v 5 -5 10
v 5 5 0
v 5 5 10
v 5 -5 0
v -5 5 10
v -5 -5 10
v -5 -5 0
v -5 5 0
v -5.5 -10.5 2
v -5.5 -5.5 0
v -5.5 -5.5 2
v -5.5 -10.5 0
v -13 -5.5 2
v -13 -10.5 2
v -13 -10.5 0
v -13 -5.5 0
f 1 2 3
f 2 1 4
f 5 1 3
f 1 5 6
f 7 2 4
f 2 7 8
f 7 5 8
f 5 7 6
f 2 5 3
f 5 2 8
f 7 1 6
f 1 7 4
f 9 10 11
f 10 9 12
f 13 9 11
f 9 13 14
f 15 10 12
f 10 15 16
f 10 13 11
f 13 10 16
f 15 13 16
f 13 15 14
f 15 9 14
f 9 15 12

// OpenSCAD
translate([0, 0, 5]) color([0,1,0,0.9]) cube([10, 10, 10], center=true);
translate([-5.75, -5.75, 1]) color([1,0,0]) cube([0.5, 0.5, 2], center=true);
translate([-6.25, -5.75, 1]) color([1,0,0]) cube([0.5, 0.5, 2], center=true);
translate([-6.75, -5.75, 1]) color([1,0,0]) cube([0.5, 0.5, 2], center=true);
translate([-7.25, -5.75, 1]) color([1,0,0]) cube([0.5, 0.5, 2], center=true);
translate([-7.75, -5.75, 1]) color([1,0,0]) cube([0.5, 0.5, 2], center=true);
translate([-8.25, -5.75, 1]) color([1,0,0]) cube([0.5, 0.5, 2], center=true);
translate([-8.75, -5.75, 1]) color([1,0,0]) cube([0.5, 0.5, 2], center=true);
translate([-9.25, -5.75, 1]) color([1,0,0]) cube([0.5, 0.5, 2], center=true);
translate([-9.75, -5.75, 1]) color([1,0,0]) cube([0.5, 0.5, 2], center=true);
translate([-10.25, -5.75, 1]) color([1,0,0]) cube([0.5, 0.5, 2], center=true);
translate([-10.75, -5.75, 1]) color([1,0,0]) cube([0.5, 0.5, 2], center=true);
translate([-11.25, -5.75, 1]) color([1,0,0]) cube([0.5, 0.5, 2], center=true);
translate([-11.75, -5.75, 1]) color([1,0,0]) cube([0.5, 0.5, 2], center=true);
translate([-12.25, -5.75, 1]) color([1,0,0]) cube([0.5, 0.5, 2], center=true);
translate([-12.75, -5.75, 1]) color([1,0,0]) cube([0.5, 0.5, 2], center=true);
translate([-5.75, -6.25, 1]) color([1,0,0]) cube([0.5, 0.5, 2], center=true);
translate([-6.25, -6.25, 1]) color([1,0,0]) cube([0.5, 0.5, 2], center=true);
translate([-6.75, -6.25, 1]) color([1,0,0]) cube([0.5, 0.5, 2], center=true);
translate([-7.25, -6.25, 1]) color([1,0,0]) cube([0.5, 0.5, 2], center=true);
translate([-7.75, -6.25, 1]) color([1,0,0]) cube([0.5, 0.5, 2], center=true);
translate([-8.25, -6.25, 1]) color([1,0,0]) cube([0.5, 0.5, 2], center=true);
translate([-8.75, -6.25, 1]) color([1,0,0]) cube([0.5, 0.5, 2], center=true);
translate([-9.25, -6.25, 1]) color([1,0,0]) cube([0.5, 0.5, 2], center=true);
translate([-9.75, -6.25, 1]) color([1,0,0]) cube([0.5, 0.5, 2], center=true);
translate([-10.25, -6.25, 1]) color([1,0,0]) cube([0.5, 0.5, 2], center=true);
translate([-10.75, -6.25, 1]) color([1,0,0]) cube([0.5, 0.5, 2], center=true);
translate([-11.25, -6.25, 1]) color([1,0,0]) cube([0.5, 0.5, 2], center=true);
translate([-11.75, -6.25, 1]) color([1,0,0]) cube([0.5, 0.5, 2], center=true);
translate([-12.25, -6.25, 1]) color([1,0,0]) cube([0.5, 0.5, 2], center=true);
translate([-12.75, -6.25, 1]) color([1,0,0]) cube([0.5, 0.5, 2], center=true);
translate([-5.75, -6.75, 1]) color([1,0,0]) cube([0.5, 0.5, 2], center=true);
translate([-6.25, -6.75, 1]) color([1,0,0]) cube([0.5, 0.5, 2], center=true);
translate([-6.75, -6.75, 1]) color([1,0,0]) cube([0.5, 0.5, 2], center=true);
translate([-7.25, -6.75, 1]) color([1,0,0]) cube([0.5, 0.5, 2], center=true);
translate([-7.75, -6.75, 1]) color([1,0,0]) cube([0.5, 0.5, 2], center=true);
translate([-8.25, -6.75, 1]) color([1,0,0]) cube([0.5, 0.5, 2], center=true);
translate([-8.75, -6.75, 1]) color([1,0,0]) cube([0.5, 0.5, 2], center=true);
translate([-9.25, -6.75, 1]) color([1,0,0]) cube([0.5, 0.5, 2], center=true);
translate([-9.75, -6.75, 1]) color([1,0,0]) cube([0.5, 0.5, 2], center=true);
translate([-10.25, -6.75, 1]) color([1,0,0]) cube([0.5, 0.5, 2], center=true);
translate([-10.75, -6.75, 1]) color([1,0,0]) cube([0.5, 0.5, 2], center=true);
translate([-11.25, -6.75, 1]) color([1,0,0]) cube([0.5, 0.5, 2], center=true);
translate([-11.75, -6.75, 1]) color([1,0,0]) cube([0.5, 0.5, 2], center=true);
translate([-12.25, -6.75, 1]) color([1,0,0]) cube([0.5, 0.5, 2], center=true);
translate([-12.75, -6.75, 1]) color([1,0,0]) cube([0.5, 0.5, 2], center=true);
translate([-5.75, -7.25, 1]) color([1,0,0]) cube([0.5, 0.5, 2], center=true);
translate([-6.25, -7.25, 1]) color([1,0,0]) cube([0.5, 0.5, 2], center=true);
translate([-6.75, -7.25, 1]) color([1,0,0]) cube([0.5, 0.5, 2], center=true);
translate([-7.25, -7.25, 1]) color([1,0,0]) cube([0.5, 0.5, 2], center=true);
translate([-7.75, -7.25, 1]) color([1,0,0]) cube([0.5, 0.5, 2], center=true);
translate([-8.25, -7.25, 1]) color([1,0,0]) cube([0.5, 0.5, 2], center=true);
translate([-8.75, -7.25, 1]) color([1,0,0]) cube([0.5, 0.5, 2], center=true);
translate([-9.25, -7.25, 1]) color([1,0,0]) cube([0.5, 0.5, 2], center=true);
translate([-9.75, -7.25, 1]) color([1,0,0]) cube([0.5, 0.5, 2], center=true);
translate([-10.25, -7.25, 1]) color([1,0,0]) cube([0.5, 0.5, 2], center=true);
translate([-10.75, -7.25, 1]) color([1,0,0]) cube([0.5, 0.5, 2], center=true);
translate([-11.25, -7.25, 1]) color([1,0,0]) cube([0.5, 0.5, 2], center=true);
translate([-11.75, -7.25, 1]) color([1,0,0]) cube([0.5, 0.5, 2], center=true);
translate([-12.25, -7.25, 1]) color([1,0,0]) cube([0.5, 0.5, 2], center=true);
translate([-12.75, -7.25, 1]) color([1,0,0]) cube([0.5, 0.5, 2], center=true);
translate([-5.75, -7.75, 1]) color([1,0,0]) cube([0.5, 0.5, 2], center=true);
translate([-6.25, -7.75, 1]) color([1,0,0]) cube([0.5, 0.5, 2], center=true);
translate([-6.75, -7.75, 1]) color([1,0,0]) cube([0.5, 0.5, 2], center=true);
translate([-7.25, -7.75, 1]) color([1,0,0]) cube([0.5, 0.5, 2], center=true);
translate([-7.75, -7.75, 1]) color([1,0,0]) cube([0.5, 0.5, 2], center=true);
translate([-8.25, -7.75, 1]) color([1,0,0]) cube([0.5, 0.5, 2], center=true);
translate([-8.75, -7.75, 1]) color([1,0,0]) cube([0.5, 0.5, 2], center=true);
translate([-9.25, -7.75, 1]) color([1,0,0]) cube([0.5, 0.5, 2], center=true);
translate([-9.75, -7.75, 1]) color([1,0,0]) cube([0.5, 0.5, 2], center=true);
translate([-10.25, -7.75, 1]) color([1,0,0]) cube([0.5, 0.5, 2], center=true);
translate([-10.75, -7.75, 1]) color([1,0,0]) cube([0.5, 0.5, 2], center=true);
translate([-11.25, -7.75, 1]) color([1,0,0]) cube([0.5, 0.5, 2], center=true);
translate([-11.75, -7.75, 1]) color([1,0,0]) cube([0.5, 0.5, 2], center=true);
translate([-12.25, -7.75, 1]) color([1,0,0]) cube([0.5, 0.5, 2], center=true);
translate([-12.75, -7.75, 1]) color([1,0,0]) cube([0.5, 0.5, 2], center=true);
translate([-5.75, -8.25, 1]) color([1,0,0]) cube([0.5, 0.5, 2], center=true);
translate([-6.25, -8.25, 1]) color([1,0,0]) cube([0.5, 0.5, 2], center=true);
translate([-6.75, -8.25, 1]) color([1,0,0]) cube([0.5, 0.5, 2], center=true);
translate([-7.25, -8.25, 1]) color([1,0,0]) cube([0.5, 0.5, 2], center=true);
translate([-7.75, -8.25, 1]) color([1,0,0]) cube([0.5, 0.5, 2], center=true);
translate([-8.25, -8.25, 1]) color([1,0,0]) cube([0.5, 0.5, 2], center=true);
translate([-8.75, -8.25, 1]) color([1,0,0]) cube([0.5, 0.5, 2], center=true);
translate([-9.25, -8.25, 1]) color([1,0,0]) cube([0.5, 0.5, 2], center=true);
translate([-9.75, -8.25, 1]) color([1,0,0]) cube([0.5, 0.5, 2], center=true);
translate([-10.25, -8.25, 1]) color([1,0,0]) cube([0.5, 0.5, 2], center=true);
translate([-10.75, -8.25, 1]) color([1,0,0]) cube([0.5, 0.5, 2], center=true);
translate([-11.25, -8.25, 1]) color([1,0,0]) cube([0.5, 0.5, 2], center=true);
translate([-11.75, -8.25, 1]) color([1,0,0]) cube([0.5, 0.5, 2], center=true);
translate([-12.25, -8.25, 1]) color([1,0,0]) cube([0.5, 0.5, 2], center=true);
translate([-12.75, -8.25, 1]) color([1,0,0]) cube([0.5, 0.5, 2], center=true);
translate([-5.75, -8.75, 1]) color([1,0,0]) cube([0.5, 0.5, 2], center=true);
translate([-6.25, -8.75, 1]) color([1,0,0]) cube([0.5, 0.5, 2], center=true);
translate([-6.75, -8.75, 1]) color([1,0,0]) cube([0.5, 0.5, 2], center=true);
translate([-7.25, -8.75, 1]) color([1,0,0]) cube([0.5, 0.5, 2], center=true);
translate([-7.75, -8.75, 1]) color([1,0,0]) cube([0.5, 0.5, 2], center=true);
translate([-8.25, -8.75, 1]) color([1,0,0]) cube([0.5, 0.5, 2], center=true);
translate([-8.75, -8.75, 1]) color([1,0,0]) cube([0.5, 0.5, 2], center=true);
translate([-9.25, -8.75, 1]) color([1,0,0]) cube([0.5, 0.5, 2], center=true);
translate([-9.75, -8.75, 1]) color([1,0,0]) cube([0.5, 0.5, 2], center=true);
translate([-10.25, -8.75, 1]) color([1,0,0]) cube([0.5, 0.5, 2], center=true);
translate([-10.75, -8.75, 1]) color([1,0,0]) cube([0.5, 0.5, 2], center=true);
translate([-11.25, -8.75, 1]) color([1,0,0]) cube([0.5, 0.5, 2], center=true);
translate([-11.75, -8.75, 1]) color([1,0,0]) cube([0.5, 0.5, 2], center=true);
translate([-12.25, -8.75, 1]) color([1,0,0]) cube([0.5, 0.5, 2], center=true);
translate([-12.75, -8.75, 1]) color([1,0,0]) cube([0.5, 0.5, 2], center=true);
translate([-5.75, -9.25, 1]) color([1,0,0]) cube([0.5, 0.5, 2], center=true);
translate([-6.25, -9.25, 1]) color([1,0,0]) cube([0.5, 0.5, 2], center=true);
translate([-6.75, -9.25, 1]) color([1,0,0]) cube([0.5, 0.5, 2], center=true);
translate([-7.25, -9.25, 1]) color([1,0,0]) cube([0.5, 0.5, 2], center=true);
translate([-7.75, -9.25, 1]) color([1,0,0]) cube([0.5, 0.5, 2], center=true);
translate([-8.25, -9.25, 1]) color([1,0,0]) cube([0.5, 0.5, 2], center=true);
translate([-8.75, -9.25, 1]) color([1,0,0]) cube([0.5, 0.5, 2], center=true);
translate([-9.25, -9.25, 1]) color([1,0,0]) cube([0.5, 0.5, 2], center=true);
translate([-9.75, -9.25, 1]) color([1,0,0]) cube([0.5, 0.5, 2], center=true);
translate([-10.25, -9.25, 1]) color([1,0,0]) cube([0.5, 0.5, 2], center=true);
translate([-10.75, -9.25, 1]) color([1,0,0]) cube([0.5, 0.5, 2], center=true);
translate([-11.25, -9.25, 1]) color([1,0,0]) cube([0.5, 0.5, 2], center=true);
translate([-11.75, -9.25, 1]) color([1,0,0]) cube([0.5, 0.5, 2], center=true);
translate([-12.25, -9.25, 1]) color([1,0,0]) cube([0.5, 0.5, 2], center=true);
translate([-12.75, -9.25, 1]) color([1,0,0]) cube([0.5, 0.5, 2], center=true);
translate([-5.75, -9.75, 1]) color([1,0,0]) cube([0.5, 0.5, 2], center=true);
translate([-6.25, -9.75, 1]) color([1,0,0]) cube([0.5, 0.5, 2], center=true);
translate([-6.75, -9.75, 1]) color([1,0,0]) cube([0.5, 0.5, 2], center=true);
translate([-7.25, -9.75, 1]) color([1,0,0]) cube([0.5, 0.5, 2], center=true);
translate([-7.75, -9.75, 1]) color([1,0,0]) cube([0.5, 0.5, 2], center=true);
translate([-8.25, -9.75, 1]) color([1,0,0]) cube([0.5, 0.5, 2], center=true);
translate([-8.75, -9.75, 1]) color([1,0,0]) cube([0.5, 0.5, 2], center=true);
translate([-9.25, -9.75, 1]) color([1,0,0]) cube([0.5, 0.5, 2], center=true);
translate([-9.75, -9.75, 1]) color([1,0,0]) cube([0.5, 0.5, 2], center=true);
translate([-10.25, -9.75, 1]) color([1,0,0]) cube([0.5, 0.5, 2], center=true);
translate([-10.75, -9.75, 1]) color([1,0,0]) cube([0.5, 0.5, 2], center=true);
translate([-11.25, -9.75, 1]) color([1,0,0]) cube([0.5, 0.5, 2], center=true);
translate([-11.75, -9.75, 1]) color([1,0,0]) cube([0.5, 0.5, 2], center=true);
translate([-12.25, -9.75, 1]) color([1,0,0]) cube([0.5, 0.5, 2], center=true);
translate([-12.75, -9.75, 1]) color([1,0,0]) cube([0.5, 0.5, 2], center=true);
translate([-5.75, -10.25, 1]) color([1,0,0]) cube([0.5, 0.5, 2], center=true);
translate([-6.25, -10.25, 1]) color([1,0,0]) cube([0.5, 0.5, 2], center=true);
translate([-6.75, -10.25, 1]) color([1,0,0]) cube([0.5, 0.5, 2], center=true);
translate([-7.25, -10.25, 1]) color([1,0,0]) cube([0.5, 0.5, 2], center=true);
translate([-7.75, -10.25, 1]) color([1,0,0]) cube([0.5, 0.5, 2], center=true);
translate([-8.25, -10.25, 1]) color([1,0,0]) cube([0.5, 0.5, 2], center=true);
translate([-8.75, -10.25, 1]) color([1,0,0]) cube([0.5, 0.5, 2], center=true);
translate([-9.25, -10.25, 1]) color([1,0,0]) cube([0.5, 0.5, 2], center=true);
translate([-9.75, -10.25, 1]) color([1,0,0]) cube([0.5, 0.5, 2], center=true);
translate([-10.25, -10.25, 1]) color([1,0,0]) cube([0.5, 0.5, 2], center=true);
translate([-10.75, -10.25, 1]) color([1,0,0]) cube([0.5, 0.5, 2], center=true);
translate([-11.25, -10.25, 1]) color([1,0,0]) cube([0.5, 0.5, 2], center=true);
translate([-11.75, -10.25, 1]) color([1,0,0]) cube([0.5, 0.5, 2], center=true);
translate([-12.25, -10.25, 1]) color([1,0,0]) cube([0.5, 0.5, 2], center=true);
translate([-12.75, -10.25, 1]) color([1,0,0]) cube([0.5, 0.5, 2], center=true);
